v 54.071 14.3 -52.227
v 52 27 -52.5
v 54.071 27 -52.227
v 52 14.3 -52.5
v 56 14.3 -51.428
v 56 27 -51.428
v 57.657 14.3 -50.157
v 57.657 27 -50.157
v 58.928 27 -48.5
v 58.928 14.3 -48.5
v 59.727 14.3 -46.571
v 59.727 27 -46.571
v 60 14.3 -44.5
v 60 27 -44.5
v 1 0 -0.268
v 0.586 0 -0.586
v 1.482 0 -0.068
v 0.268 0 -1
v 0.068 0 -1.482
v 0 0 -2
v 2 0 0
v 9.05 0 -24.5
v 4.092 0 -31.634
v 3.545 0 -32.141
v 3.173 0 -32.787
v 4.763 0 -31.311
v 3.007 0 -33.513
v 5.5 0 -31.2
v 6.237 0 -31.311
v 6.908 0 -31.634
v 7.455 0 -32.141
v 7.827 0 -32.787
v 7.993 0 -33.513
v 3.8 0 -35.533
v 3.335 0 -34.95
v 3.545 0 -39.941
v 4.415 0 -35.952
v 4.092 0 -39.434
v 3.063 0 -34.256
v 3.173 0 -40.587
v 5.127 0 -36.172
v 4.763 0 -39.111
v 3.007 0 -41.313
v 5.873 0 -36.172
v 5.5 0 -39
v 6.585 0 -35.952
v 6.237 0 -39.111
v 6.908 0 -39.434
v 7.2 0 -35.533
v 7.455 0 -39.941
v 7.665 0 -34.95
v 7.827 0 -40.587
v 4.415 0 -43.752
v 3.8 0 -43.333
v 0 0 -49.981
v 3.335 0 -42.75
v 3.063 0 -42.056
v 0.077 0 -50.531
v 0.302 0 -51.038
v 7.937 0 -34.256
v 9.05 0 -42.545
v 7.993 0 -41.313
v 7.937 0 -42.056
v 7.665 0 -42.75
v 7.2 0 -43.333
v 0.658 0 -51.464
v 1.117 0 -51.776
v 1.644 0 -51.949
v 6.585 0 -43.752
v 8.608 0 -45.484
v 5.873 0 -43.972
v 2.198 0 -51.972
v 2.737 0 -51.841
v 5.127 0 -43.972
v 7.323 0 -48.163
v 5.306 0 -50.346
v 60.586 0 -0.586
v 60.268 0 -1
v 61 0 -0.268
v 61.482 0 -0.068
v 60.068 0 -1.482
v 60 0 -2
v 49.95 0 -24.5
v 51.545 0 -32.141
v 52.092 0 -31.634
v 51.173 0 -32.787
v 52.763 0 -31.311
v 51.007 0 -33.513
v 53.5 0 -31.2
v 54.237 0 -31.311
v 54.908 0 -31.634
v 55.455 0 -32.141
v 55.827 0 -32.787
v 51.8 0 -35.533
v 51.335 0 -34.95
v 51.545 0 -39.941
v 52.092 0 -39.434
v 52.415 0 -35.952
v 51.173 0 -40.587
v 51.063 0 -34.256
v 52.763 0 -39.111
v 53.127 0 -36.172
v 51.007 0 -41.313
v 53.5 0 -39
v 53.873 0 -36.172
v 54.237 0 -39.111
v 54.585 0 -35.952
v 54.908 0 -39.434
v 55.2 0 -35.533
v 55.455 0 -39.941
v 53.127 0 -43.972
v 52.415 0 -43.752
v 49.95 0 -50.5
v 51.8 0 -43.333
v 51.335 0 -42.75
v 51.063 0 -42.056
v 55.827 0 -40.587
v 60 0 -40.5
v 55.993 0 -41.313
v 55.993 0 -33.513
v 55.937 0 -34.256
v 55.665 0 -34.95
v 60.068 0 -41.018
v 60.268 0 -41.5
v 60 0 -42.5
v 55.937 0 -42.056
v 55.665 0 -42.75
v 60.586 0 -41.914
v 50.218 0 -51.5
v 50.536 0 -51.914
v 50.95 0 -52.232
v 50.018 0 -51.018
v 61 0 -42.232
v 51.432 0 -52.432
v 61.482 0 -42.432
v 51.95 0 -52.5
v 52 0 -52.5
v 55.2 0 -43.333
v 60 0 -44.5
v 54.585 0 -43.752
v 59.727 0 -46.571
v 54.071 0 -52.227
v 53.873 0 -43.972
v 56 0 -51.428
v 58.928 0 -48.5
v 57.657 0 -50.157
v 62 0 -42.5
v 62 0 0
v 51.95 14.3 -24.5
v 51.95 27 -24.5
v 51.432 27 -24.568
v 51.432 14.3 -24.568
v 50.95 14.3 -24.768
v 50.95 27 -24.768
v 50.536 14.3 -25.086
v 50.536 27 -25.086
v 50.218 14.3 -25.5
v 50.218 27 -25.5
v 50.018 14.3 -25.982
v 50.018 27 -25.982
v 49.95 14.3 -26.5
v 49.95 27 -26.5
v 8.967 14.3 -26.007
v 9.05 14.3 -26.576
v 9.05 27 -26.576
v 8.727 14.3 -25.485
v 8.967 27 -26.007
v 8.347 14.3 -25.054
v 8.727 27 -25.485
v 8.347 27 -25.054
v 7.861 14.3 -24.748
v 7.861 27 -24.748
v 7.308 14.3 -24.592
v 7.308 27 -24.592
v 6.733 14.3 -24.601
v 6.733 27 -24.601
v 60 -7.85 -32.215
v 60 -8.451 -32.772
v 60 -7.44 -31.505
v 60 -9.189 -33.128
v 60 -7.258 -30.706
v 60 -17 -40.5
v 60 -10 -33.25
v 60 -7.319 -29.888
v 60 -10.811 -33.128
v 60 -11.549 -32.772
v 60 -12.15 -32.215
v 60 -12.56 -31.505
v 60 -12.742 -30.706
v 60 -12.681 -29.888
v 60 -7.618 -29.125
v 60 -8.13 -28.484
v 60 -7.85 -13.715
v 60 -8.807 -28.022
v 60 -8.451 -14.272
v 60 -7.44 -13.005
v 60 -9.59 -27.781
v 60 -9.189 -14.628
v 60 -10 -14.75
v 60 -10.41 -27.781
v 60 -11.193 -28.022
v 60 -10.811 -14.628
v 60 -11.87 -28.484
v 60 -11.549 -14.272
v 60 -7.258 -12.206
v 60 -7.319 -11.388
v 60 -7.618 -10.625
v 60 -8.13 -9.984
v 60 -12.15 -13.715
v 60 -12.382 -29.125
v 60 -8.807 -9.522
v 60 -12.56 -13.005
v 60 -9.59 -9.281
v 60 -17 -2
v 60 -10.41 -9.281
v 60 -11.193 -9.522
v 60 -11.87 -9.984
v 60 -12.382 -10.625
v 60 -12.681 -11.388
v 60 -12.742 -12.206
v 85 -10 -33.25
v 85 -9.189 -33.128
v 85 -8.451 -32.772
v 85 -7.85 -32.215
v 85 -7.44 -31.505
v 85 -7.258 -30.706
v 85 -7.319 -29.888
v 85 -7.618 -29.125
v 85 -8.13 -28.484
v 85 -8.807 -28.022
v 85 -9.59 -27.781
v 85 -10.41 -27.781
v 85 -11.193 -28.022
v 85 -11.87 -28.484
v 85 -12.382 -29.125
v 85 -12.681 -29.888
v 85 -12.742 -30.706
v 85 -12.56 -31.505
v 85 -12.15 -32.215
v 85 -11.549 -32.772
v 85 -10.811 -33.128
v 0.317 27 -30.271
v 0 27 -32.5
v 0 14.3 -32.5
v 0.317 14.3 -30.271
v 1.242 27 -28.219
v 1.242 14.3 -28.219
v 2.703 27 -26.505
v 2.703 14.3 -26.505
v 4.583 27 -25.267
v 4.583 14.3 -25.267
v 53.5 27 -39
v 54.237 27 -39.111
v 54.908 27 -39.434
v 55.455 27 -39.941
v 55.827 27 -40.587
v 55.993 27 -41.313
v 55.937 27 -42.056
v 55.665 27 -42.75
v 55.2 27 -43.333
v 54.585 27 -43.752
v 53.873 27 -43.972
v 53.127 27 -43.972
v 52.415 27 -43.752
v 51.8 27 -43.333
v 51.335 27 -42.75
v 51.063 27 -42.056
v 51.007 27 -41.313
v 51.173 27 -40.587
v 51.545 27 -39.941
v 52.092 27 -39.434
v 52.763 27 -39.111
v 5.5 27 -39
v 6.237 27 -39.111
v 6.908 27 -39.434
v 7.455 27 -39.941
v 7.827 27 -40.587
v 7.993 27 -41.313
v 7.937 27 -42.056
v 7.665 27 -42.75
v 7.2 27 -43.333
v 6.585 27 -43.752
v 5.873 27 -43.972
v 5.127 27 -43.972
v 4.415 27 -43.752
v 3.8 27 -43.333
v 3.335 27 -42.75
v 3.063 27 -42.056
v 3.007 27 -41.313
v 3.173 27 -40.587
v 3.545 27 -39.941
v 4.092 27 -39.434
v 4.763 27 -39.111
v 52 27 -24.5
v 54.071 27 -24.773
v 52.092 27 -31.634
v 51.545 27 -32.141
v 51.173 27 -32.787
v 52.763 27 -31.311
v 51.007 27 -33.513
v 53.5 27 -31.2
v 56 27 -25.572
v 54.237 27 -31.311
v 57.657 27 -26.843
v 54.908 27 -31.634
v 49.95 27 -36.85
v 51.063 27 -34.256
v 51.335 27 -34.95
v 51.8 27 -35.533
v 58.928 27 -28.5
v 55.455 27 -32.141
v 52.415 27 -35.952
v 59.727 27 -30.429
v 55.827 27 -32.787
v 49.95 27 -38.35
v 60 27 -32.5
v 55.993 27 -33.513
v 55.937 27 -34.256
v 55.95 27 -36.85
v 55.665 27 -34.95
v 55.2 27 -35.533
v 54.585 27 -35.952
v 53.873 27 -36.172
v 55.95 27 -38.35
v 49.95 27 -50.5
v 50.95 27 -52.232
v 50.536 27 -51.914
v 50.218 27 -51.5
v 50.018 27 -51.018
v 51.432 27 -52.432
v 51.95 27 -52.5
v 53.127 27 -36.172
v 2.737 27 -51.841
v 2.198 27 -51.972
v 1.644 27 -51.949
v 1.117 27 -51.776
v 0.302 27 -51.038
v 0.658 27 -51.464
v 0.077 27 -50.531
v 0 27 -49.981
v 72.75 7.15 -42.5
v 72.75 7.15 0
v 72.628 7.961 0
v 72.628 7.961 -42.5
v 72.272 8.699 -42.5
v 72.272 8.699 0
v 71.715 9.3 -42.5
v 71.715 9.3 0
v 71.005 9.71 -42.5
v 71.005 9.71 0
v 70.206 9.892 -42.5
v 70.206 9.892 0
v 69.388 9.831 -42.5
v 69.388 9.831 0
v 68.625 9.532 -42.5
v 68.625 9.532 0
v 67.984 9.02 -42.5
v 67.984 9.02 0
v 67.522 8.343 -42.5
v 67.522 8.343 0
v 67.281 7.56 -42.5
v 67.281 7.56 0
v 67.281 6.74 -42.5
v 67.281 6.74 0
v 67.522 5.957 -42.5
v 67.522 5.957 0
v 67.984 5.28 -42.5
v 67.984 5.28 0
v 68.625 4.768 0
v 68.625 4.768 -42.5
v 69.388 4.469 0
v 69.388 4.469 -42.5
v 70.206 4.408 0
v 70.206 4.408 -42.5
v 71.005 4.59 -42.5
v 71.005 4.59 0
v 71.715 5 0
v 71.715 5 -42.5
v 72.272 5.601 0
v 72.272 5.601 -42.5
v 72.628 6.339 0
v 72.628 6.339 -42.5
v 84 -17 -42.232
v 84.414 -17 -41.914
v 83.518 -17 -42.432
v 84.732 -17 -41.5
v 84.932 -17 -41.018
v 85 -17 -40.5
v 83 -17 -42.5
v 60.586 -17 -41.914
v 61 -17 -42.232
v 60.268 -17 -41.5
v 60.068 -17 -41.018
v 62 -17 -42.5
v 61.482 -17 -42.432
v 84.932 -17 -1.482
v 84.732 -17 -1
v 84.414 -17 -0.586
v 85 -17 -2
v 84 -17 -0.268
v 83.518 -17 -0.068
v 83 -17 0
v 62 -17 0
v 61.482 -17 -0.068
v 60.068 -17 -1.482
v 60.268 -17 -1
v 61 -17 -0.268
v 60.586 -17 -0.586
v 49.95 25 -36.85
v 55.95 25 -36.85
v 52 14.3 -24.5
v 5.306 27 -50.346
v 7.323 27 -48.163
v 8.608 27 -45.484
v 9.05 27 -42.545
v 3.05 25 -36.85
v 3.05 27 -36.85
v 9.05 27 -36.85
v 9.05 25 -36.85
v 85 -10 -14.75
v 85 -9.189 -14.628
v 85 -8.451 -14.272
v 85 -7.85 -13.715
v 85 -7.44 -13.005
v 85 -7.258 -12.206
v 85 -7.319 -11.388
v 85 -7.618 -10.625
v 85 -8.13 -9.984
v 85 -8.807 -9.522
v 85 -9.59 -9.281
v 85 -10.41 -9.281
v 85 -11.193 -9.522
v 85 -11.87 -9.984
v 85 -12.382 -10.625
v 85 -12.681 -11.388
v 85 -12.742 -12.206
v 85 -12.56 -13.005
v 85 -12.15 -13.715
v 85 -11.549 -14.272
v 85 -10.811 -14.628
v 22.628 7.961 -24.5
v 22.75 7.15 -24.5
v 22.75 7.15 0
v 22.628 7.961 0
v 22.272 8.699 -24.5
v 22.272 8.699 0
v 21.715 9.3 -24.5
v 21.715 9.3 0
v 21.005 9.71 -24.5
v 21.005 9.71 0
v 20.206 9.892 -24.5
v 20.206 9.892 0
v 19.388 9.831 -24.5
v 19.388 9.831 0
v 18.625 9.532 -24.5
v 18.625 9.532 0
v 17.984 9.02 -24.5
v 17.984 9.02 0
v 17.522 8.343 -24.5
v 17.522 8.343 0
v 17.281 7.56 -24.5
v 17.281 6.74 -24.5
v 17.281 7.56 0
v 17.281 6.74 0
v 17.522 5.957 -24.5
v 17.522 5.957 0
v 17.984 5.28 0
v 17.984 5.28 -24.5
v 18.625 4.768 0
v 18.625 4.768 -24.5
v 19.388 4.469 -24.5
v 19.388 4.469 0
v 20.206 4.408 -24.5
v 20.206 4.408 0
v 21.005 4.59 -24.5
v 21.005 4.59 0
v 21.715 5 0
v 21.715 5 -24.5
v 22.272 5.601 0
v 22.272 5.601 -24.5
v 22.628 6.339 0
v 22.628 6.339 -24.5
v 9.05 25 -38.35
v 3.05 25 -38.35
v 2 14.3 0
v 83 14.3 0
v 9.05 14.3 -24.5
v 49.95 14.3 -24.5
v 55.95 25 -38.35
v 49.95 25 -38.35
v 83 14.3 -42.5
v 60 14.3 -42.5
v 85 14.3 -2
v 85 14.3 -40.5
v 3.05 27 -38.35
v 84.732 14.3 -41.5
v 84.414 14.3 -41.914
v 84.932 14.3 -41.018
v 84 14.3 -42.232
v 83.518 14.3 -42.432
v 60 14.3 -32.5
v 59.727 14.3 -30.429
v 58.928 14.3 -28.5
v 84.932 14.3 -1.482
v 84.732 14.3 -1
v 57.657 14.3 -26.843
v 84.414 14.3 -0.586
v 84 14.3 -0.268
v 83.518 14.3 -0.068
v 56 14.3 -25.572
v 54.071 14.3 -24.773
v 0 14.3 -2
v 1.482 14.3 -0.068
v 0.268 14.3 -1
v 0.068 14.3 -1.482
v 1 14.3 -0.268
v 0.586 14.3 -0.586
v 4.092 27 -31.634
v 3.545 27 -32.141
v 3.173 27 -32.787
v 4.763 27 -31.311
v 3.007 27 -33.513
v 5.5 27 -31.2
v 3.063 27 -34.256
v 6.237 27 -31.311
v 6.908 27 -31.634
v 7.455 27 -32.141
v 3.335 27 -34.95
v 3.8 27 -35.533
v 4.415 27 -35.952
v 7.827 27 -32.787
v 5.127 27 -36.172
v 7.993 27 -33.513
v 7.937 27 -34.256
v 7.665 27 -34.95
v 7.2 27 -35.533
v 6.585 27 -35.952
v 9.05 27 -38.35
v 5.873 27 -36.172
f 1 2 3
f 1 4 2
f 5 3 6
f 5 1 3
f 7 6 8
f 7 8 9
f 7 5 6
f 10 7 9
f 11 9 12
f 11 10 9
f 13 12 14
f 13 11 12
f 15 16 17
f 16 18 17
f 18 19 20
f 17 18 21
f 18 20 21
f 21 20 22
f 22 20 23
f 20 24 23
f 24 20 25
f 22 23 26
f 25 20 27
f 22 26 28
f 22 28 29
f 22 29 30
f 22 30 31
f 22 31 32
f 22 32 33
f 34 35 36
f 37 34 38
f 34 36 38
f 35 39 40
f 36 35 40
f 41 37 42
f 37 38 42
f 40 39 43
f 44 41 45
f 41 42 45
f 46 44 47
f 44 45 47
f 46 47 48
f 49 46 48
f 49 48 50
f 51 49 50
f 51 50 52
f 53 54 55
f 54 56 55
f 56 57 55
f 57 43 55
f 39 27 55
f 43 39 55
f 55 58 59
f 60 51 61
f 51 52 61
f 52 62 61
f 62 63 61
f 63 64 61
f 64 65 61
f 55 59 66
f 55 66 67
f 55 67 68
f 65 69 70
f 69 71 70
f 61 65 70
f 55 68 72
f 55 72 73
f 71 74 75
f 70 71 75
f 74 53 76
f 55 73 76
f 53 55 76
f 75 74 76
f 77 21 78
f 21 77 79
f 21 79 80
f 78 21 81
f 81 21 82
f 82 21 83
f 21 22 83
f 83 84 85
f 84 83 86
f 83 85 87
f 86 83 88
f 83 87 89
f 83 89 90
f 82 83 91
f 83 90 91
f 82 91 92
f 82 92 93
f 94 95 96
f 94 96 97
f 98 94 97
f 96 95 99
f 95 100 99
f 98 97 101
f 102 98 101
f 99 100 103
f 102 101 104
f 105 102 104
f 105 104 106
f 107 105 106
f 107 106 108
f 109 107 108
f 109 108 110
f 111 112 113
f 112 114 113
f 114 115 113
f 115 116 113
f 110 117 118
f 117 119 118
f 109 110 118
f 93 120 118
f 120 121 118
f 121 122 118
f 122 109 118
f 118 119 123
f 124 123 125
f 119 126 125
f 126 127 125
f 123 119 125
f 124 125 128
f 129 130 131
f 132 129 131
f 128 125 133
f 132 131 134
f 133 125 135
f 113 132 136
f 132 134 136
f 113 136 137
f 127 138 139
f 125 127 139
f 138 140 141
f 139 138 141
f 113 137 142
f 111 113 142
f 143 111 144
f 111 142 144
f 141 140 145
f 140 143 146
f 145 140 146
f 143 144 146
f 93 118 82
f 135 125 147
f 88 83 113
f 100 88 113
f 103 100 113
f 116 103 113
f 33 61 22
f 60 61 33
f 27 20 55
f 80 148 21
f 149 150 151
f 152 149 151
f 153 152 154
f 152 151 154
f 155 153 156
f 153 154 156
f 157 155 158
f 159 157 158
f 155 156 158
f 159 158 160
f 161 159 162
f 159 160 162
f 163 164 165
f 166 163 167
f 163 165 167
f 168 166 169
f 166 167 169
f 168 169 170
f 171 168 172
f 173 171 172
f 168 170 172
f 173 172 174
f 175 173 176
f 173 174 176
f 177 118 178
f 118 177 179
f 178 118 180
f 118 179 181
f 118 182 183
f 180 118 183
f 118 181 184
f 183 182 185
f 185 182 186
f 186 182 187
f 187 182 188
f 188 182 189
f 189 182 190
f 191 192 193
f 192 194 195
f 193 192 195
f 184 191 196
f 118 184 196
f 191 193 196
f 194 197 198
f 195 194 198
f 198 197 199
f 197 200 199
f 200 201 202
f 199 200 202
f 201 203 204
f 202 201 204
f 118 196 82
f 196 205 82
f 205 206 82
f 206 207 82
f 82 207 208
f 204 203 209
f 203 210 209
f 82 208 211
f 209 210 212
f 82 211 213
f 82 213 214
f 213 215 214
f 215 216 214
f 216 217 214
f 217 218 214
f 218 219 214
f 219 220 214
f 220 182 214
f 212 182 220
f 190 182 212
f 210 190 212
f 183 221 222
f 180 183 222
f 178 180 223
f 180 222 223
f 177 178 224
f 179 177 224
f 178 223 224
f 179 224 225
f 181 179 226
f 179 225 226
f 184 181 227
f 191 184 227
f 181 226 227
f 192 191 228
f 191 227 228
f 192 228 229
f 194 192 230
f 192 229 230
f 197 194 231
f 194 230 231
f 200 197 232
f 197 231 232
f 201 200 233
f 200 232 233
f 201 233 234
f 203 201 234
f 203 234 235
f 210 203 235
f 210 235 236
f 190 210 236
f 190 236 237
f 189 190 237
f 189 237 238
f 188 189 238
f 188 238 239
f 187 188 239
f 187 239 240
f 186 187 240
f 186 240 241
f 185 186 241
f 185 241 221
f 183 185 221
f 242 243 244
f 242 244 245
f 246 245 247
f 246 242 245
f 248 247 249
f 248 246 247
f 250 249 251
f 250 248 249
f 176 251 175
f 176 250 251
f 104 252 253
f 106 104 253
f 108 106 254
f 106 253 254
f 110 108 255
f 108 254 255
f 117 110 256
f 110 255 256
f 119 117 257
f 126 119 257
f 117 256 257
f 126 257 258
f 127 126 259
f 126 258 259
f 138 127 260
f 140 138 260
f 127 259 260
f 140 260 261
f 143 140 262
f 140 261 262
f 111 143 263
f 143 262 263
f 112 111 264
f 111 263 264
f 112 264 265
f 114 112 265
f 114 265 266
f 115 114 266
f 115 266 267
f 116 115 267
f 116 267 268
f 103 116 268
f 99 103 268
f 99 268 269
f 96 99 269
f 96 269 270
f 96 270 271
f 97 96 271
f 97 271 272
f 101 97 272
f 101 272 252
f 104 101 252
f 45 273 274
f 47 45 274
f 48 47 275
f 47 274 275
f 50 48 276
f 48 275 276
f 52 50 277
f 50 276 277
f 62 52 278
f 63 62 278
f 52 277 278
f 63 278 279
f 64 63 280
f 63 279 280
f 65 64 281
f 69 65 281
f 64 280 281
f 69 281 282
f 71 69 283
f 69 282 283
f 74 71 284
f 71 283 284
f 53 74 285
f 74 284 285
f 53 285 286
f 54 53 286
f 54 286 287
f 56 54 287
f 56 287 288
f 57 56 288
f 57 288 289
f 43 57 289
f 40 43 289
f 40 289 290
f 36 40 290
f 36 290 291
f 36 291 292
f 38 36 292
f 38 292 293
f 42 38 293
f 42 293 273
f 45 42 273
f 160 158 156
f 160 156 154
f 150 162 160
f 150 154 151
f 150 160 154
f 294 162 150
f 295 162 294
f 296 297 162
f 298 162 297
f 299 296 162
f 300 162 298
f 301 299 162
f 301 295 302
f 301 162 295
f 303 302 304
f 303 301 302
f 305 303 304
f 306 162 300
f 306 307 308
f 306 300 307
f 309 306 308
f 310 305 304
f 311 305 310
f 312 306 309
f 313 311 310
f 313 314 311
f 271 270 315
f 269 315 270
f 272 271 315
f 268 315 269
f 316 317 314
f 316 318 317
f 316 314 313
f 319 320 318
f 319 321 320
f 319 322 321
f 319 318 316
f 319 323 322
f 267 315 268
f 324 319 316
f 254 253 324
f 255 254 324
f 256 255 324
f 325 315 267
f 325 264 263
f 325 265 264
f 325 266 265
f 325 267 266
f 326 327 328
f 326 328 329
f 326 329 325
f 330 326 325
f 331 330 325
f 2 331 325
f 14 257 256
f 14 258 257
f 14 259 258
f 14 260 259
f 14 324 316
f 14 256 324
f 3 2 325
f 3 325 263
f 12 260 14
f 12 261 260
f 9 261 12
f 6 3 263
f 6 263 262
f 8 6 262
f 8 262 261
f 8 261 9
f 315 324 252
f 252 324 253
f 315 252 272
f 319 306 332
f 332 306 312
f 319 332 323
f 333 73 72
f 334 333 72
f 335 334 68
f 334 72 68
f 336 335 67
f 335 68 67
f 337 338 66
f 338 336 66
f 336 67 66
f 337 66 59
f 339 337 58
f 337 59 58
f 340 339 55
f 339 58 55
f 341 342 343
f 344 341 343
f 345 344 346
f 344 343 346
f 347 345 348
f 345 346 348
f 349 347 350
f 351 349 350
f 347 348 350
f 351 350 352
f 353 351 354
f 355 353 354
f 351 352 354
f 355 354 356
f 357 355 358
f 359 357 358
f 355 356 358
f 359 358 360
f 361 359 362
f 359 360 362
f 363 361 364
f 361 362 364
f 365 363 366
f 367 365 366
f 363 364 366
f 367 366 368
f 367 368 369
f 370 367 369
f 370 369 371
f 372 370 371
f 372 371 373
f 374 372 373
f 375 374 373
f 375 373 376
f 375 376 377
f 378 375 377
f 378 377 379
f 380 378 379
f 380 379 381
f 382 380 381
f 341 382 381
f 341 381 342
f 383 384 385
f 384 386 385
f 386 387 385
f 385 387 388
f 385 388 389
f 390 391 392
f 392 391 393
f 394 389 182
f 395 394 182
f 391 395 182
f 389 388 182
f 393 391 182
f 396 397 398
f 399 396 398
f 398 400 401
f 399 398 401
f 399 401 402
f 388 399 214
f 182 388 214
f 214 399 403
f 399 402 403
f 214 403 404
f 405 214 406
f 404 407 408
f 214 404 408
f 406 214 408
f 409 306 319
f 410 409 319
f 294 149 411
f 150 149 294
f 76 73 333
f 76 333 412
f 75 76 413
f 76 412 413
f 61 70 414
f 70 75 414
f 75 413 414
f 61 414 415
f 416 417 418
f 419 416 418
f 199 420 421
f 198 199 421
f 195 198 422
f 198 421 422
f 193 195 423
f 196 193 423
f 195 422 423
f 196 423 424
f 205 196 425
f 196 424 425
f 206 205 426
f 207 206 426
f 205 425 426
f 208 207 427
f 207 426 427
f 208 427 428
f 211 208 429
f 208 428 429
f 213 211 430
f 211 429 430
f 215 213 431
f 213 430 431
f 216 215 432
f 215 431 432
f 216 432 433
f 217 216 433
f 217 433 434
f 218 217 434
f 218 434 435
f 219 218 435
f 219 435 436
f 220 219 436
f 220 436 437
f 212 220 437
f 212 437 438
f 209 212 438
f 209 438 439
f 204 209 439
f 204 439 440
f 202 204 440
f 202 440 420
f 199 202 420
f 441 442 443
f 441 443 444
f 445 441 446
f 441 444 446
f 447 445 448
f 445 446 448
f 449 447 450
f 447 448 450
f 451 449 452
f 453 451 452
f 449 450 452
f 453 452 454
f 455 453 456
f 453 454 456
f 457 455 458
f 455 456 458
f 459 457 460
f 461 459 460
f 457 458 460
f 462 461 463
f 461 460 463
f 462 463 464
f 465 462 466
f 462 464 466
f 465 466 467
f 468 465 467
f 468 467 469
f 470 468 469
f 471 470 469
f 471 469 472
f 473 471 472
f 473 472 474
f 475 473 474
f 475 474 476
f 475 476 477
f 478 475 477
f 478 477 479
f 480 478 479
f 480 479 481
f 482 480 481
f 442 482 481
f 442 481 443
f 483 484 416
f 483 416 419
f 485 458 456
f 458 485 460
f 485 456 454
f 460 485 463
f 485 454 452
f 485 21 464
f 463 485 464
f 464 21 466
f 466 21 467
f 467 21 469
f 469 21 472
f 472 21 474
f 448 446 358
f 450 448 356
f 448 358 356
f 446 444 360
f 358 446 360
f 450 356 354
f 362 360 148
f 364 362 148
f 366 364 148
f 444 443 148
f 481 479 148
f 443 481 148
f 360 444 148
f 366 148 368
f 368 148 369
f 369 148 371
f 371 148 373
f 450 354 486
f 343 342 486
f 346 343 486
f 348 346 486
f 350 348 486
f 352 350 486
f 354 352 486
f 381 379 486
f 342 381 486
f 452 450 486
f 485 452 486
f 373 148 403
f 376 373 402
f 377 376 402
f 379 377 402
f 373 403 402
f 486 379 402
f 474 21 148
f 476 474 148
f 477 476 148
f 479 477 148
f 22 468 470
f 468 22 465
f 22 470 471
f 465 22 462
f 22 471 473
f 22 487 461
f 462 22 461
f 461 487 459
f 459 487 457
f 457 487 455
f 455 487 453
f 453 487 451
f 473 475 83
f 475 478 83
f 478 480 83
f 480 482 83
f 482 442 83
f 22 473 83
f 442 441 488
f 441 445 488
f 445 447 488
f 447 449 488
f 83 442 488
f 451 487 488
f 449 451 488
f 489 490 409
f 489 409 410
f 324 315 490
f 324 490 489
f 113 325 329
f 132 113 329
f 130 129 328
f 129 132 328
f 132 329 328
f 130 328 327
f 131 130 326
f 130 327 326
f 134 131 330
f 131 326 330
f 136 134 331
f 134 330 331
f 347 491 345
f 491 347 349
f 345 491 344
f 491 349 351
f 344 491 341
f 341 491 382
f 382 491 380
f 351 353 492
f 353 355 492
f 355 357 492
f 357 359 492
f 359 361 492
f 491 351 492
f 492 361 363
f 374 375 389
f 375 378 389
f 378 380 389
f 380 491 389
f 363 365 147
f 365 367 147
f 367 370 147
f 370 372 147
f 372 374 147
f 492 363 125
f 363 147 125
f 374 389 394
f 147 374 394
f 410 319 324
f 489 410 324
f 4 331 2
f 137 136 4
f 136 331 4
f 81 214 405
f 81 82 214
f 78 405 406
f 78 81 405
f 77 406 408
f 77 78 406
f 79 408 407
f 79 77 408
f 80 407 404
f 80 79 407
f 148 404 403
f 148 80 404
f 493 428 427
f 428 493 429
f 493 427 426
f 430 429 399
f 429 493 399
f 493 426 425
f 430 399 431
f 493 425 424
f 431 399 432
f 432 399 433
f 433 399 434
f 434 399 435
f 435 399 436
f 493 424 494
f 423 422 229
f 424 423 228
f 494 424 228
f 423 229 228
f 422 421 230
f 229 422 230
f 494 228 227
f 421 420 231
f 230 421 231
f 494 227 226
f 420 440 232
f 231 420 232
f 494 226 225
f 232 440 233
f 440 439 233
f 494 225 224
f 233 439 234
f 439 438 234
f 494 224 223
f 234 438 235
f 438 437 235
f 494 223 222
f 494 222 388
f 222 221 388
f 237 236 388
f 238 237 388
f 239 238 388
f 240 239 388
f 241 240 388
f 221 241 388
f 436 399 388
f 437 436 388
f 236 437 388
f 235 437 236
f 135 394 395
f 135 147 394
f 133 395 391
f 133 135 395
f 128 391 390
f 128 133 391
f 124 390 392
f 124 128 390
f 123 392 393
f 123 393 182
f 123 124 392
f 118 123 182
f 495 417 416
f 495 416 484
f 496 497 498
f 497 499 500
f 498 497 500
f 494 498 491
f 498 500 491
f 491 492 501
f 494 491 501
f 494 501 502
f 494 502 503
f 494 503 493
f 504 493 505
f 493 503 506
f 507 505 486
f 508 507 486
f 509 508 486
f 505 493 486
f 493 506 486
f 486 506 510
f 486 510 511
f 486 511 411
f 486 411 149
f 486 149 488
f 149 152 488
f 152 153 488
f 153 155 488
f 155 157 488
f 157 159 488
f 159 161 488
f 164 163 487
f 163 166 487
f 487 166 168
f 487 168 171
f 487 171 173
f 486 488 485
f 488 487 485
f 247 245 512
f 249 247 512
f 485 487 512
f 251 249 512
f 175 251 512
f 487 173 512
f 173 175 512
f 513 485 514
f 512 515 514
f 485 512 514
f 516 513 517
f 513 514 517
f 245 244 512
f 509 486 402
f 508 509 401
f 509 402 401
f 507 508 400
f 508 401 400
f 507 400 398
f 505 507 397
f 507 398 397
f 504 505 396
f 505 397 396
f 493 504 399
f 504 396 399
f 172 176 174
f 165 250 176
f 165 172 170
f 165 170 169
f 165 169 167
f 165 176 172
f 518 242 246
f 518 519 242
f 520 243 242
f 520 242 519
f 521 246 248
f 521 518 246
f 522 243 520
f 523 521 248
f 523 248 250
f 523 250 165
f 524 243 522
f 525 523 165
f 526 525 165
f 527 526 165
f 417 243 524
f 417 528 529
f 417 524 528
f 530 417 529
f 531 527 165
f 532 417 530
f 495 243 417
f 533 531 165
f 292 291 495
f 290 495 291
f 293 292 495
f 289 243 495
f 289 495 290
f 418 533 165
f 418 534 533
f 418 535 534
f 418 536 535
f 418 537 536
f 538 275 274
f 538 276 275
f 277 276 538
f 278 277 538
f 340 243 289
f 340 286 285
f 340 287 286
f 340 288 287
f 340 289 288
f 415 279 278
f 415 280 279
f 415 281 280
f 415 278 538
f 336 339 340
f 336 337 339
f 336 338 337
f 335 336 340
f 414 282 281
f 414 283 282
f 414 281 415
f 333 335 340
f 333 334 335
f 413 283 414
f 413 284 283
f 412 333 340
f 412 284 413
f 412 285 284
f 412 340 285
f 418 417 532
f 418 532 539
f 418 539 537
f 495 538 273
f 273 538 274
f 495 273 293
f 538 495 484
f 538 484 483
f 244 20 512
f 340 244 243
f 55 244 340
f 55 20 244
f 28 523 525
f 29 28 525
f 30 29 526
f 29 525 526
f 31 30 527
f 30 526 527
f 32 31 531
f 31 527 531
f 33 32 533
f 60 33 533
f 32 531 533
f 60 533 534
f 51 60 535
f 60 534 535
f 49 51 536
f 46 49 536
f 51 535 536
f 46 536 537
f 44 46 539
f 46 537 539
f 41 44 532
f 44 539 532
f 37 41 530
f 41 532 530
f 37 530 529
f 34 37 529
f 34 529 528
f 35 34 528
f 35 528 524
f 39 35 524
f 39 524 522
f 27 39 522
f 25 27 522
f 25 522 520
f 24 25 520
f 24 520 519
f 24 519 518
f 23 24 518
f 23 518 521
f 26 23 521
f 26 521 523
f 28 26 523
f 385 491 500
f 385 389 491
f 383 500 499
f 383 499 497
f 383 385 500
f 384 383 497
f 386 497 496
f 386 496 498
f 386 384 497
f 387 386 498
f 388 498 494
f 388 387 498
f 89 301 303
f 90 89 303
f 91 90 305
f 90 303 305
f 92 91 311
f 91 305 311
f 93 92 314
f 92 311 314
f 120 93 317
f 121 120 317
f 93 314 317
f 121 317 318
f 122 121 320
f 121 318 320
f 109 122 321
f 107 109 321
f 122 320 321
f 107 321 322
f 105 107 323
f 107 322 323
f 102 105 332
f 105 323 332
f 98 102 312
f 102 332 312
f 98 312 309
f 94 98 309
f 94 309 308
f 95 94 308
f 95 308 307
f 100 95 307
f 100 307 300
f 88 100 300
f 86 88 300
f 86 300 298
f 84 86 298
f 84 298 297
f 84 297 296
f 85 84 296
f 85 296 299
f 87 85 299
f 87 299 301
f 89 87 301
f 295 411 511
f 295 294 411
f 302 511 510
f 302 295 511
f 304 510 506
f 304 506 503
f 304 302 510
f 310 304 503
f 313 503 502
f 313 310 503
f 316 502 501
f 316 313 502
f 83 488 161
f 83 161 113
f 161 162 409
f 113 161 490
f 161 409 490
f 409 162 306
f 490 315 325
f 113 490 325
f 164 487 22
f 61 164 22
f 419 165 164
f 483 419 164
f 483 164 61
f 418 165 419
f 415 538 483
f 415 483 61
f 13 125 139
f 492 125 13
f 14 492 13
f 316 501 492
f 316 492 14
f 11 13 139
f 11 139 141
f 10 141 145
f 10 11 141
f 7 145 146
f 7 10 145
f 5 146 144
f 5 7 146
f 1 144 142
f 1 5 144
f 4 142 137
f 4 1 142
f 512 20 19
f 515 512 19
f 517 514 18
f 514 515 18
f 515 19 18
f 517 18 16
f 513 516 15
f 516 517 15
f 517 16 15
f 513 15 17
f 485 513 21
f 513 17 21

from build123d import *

# Parameters (mm, degrees)
SKETCH1_W           = 85
SKETCH1_H           = 52.5
BOSS_EXTRUDE1_DEPTH = 27
SKETCH2_R           = 2.5
CUT_EXTRUDE1_DEPTH  = 104.490337713
SKETCH4_W           = 24.5
SKETCH4_H           = 12.7
CUT_EXTRUDE2_DEPTH  = 104.490337713
SKETCH5_W           = 25
SKETCH5_H           = 12.7
CUT_EXTRUDE3_DEPTH  = 94.477269964
SKETCH6_W           = 40.9
SKETCH6_H           = 28
CUT_EXTRUDE4_DEPTH  = 104.490337713
FILLET1_R           = 10
FILLET2_R           = 8
FILLET4_R           = 2
SKETCH7_R           = 2.75
CUT_EXTRUDE5_DEPTH  = 104.490337713
SKETCH8_W           = 6
SKETCH8_H           = 1.5
CUT_EXTRUDE6_DEPTH  = 2
CUT_EXTRUDE7_DEPTH  = 101.924427172
BOSS_EXTRUDE2_START = 17
BOSS_EXTRUDE2_DEPTH = 17
SKETCH11_R          = 2.75
CUT_EXTRUDE8_DEPTH  = 104.490337713
FILLET5_R           = 2


with BuildPart() as part:
    # Sketch1 → Boss-Extrude1 (new body)
    with BuildSketch(Plane(origin=(0, 0, 0), x_dir=(1, 0, 0), z_dir=(0, 1, 0))):
        with Locations((42.5, 26.25)):
            Rectangle(SKETCH1_W, SKETCH1_H)
    extrude(amount=BOSS_EXTRUDE1_DEPTH)

    # Sketch2 → Cut-Extrude1 (cut, through all)
    with BuildSketch(Plane(origin=(0, 27, 0), x_dir=(1, 0, 0), z_dir=(0, 1, 0))):
        with Locations(Location((5.5, 41.5, 0), (0, 0, 270))):
            Circle(SKETCH2_R)
        with Locations(Location((53.5, 41.5, 0), (0, 0, 270))):
            Circle(SKETCH2_R)
        with Locations(Location((53.5, 33.7, 0), (0, 0, 270))):
            Circle(SKETCH2_R)
        with Locations(Location((5.5, 33.7, 0), (0, 0, 270))):
            Circle(SKETCH2_R)
    extrude(amount=-CUT_EXTRUDE1_DEPTH, mode=Mode.SUBTRACT)

    # Sketch4 → Cut-Extrude2 (cut, through all)
    with BuildSketch(Plane.ZY):
        with Locations((-12.25, 20.65)):
            Rectangle(SKETCH4_W, SKETCH4_H)
    extrude(amount=-CUT_EXTRUDE2_DEPTH, mode=Mode.SUBTRACT)

    # Sketch5 → Cut-Extrude3 (cut, through all)
    with BuildSketch(Plane.XY.offset(-24.5)):
        with Locations((72.5, 20.65)):
            Rectangle(SKETCH5_W, SKETCH5_H)
    extrude(amount=-CUT_EXTRUDE3_DEPTH, mode=Mode.SUBTRACT)

    # Sketch6 → Cut-Extrude4 (cut, through all)
    with BuildSketch(Plane(origin=(0, 27, 0), x_dir=(1, 0, 0), z_dir=(0, 1, 0))):
        with Locations((29.5, 38.5)):
            Rectangle(SKETCH6_W, SKETCH6_H)
    extrude(amount=-CUT_EXTRUDE4_DEPTH, mode=Mode.SUBTRACT)

    # Fillet1
    # the kernel refuses this fillet: 10 mm, written as the material it takes off along each edge
    with BuildSketch(Plane(origin=(9.05, 51.886931812, -52.5), x_dir=(-1, 0, 0), z_dir=(0, -1, 0))) as fillet1_piece_1:
        with BuildLine():
            CenterArc((10, -9.954772725), FILLET1_R, 95.451319812, 84.548680188)
            Line((0, -9.954772725), (-0.2, -9.954772725))
            Line((-0.2, -9.954772725), (-0.2, 0))
            Line((-0.2, 0), (0, 0.2))
            ThreePointArc((0, 0.2), (4.525, 0.2), (9.031, 0.199095454))
            Line((9.031, 0.199095454), (9.05, 0))
        make_face()
    extrude(amount=76.773863623, mode=Mode.SUBTRACT)

    # Fillet2
    fillet2_edges = [part.edges().sort_by_distance(p)[0] for p in [
        (0, 20.65, -24.5),
        (60, 20.65, -52.5),
        (60, 20.65, -24.5),
    ]]
    fillet(fillet2_edges, radius=FILLET2_R)

    # Fillet4
    # the kernel refuses this fillet: 2 mm, written as the material it takes off along each edge
    with BuildSketch(Plane(origin=(9.05, 32.797158858, -24.5), x_dir=(0, 0, -1), z_dir=(0, -1, 0))) as fillet4_piece_1:
        with BuildLine():
            CenterArc((2.075685694, -2), FILLET4_R, 90, 99.110170153)
            Line((0.100914258, -2.316666667), (-0.096562885, -2.348333333))
            ThreePointArc((-0.096562885, -2.348333333), (-0.2, -1.05), (-0.2, 0))
            Line((-0.2, 0), (0, 0.2))
            Line((0, 0.2), (2.075685694, 0.2))
            Line((2.075685694, 0.2), (2.075685694, 0))
        make_face()
    extrude(amount=18.497158858, mode=Mode.SUBTRACT)
    with BuildSketch(Plane(origin=(49.95, 32, -24.5), x_dir=(0, 0, -1), z_dir=(0, -1, 0))) as fillet4_piece_2:
        with BuildLine():
            CenterArc((FILLET4_R, FILLET4_R), FILLET4_R, 180, 90)
            Line((0, FILLET4_R), (0, 0))
            Line((0, 0), (FILLET4_R, 0))
        make_face()
    extrude(amount=17.7, mode=Mode.SUBTRACT)
    with BuildSketch(Plane(origin=(49.95, 32, -52.5), x_dir=(0, 0, 1), z_dir=(0, -1, 0))) as fillet4_piece_3:
        with BuildLine():
            CenterArc((FILLET4_R, -FILLET4_R), FILLET4_R, 90, 90)
            Line((0, -FILLET4_R), (0, 0))
            Line((0, 0), (FILLET4_R, 0))
        make_face()
    extrude(amount=37, mode=Mode.SUBTRACT)
    with BuildSketch(Plane(origin=(85, -5, -52.5), x_dir=(0, 0, 1), z_dir=(0, 1, 0)), Plane(origin=(85, -5, 0), x_dir=(-1, 0, 0), z_dir=(0, 1, 0)), Plane(origin=(0, -5, 0), x_dir=(0, 0, -1), z_dir=(0, 1, 0))) as fillet4_piece_4:
        with BuildLine():
            CenterArc((FILLET4_R, -FILLET4_R), FILLET4_R, 90, 90)
            Line((0, -FILLET4_R), (0, 0))
            Line((0, 0), (FILLET4_R, 0))
        make_face()
    extrude(amount=24.3, mode=Mode.SUBTRACT)
    with BuildSketch(Plane(origin=(0, -7.039544043, -52.5), x_dir=(0.972186544788057, 0, 0.23420786095487744), z_dir=(0, 1, 0))) as fillet4_piece_5:
        with BuildLine():
            CenterArc((2.534235855, -1.980078713), FILLET4_R, 81.906386313, 111.638547186)
            Line((0.589862766, -2.448494435), (0, 0))
            ThreePointArc((0, 0), (1.407908809, 0.099606433), (2.815817617, 0))
        make_face()
    extrude(amount=41.079088086, mode=Mode.SUBTRACT)

    # Sketch7 → Cut-Extrude5 (cut, through all)
    with BuildSketch(Plane.XY):
        with Locations((70, 7.15)):
            Circle(SKETCH7_R)
        with Locations((20, 7.15)):
            Circle(SKETCH7_R)
    extrude(amount=-CUT_EXTRUDE5_DEPTH, mode=Mode.SUBTRACT)

    # Sketch8 → Cut-Extrude6 (cut)
    with BuildSketch(Plane(origin=(0, 27, 0), x_dir=(1, 0, 0), z_dir=(0, 1, 0))):
        with Locations((6.05, 37.6)):
            Rectangle(SKETCH8_W, SKETCH8_H)
        with Locations((52.95, 37.6)):
            Rectangle(SKETCH8_W, SKETCH8_H)
    extrude(amount=-CUT_EXTRUDE6_DEPTH, mode=Mode.SUBTRACT)

    # Sketch9 → Cut-Extrude7 (cut, through all)
    with BuildSketch(Plane(origin=(0, 14.3, 0), x_dir=(1, 0, 0), z_dir=(0, 1, 0))):
        with BuildLine():
            Line((85, 42.5), (60, 42.5))
            Line((60, 42.5), (60, 44.5))
            ThreePointArc((60, 44.5), (57.656854249, 50.156854249), (52, 52.5))
            Line((52, 52.5), (83, 52.5))
            Line((83, 52.5), (85, 52.5))
            Line((85, 52.5), (85, 42.5))
        make_face()
    extrude(amount=-CUT_EXTRUDE7_DEPTH, mode=Mode.SUBTRACT)

    # Sketch10 → Boss-Extrude2 (add)
    with BuildSketch(Plane.XZ.offset(BOSS_EXTRUDE2_START)):
        with BuildLine():
            Line((85, -42.5), (60, -42.5))
            Line((60, -42.5), (60, 0))
            Line((60, 0), (83, 0))
            ThreePointArc((83, 0), (84.414213562, -0.585786438), (85, -2))
            Line((85, -2), (85, -42.5))
        make_face()
    extrude(amount=-BOSS_EXTRUDE2_DEPTH)

    # Sketch11 → Cut-Extrude8 (cut, through all)
    with BuildSketch(Plane(origin=(85, 0, 0), x_dir=(0, 0, -1), z_dir=(1, 0, 0))):
        with Locations((30.5, -10)):
            Circle(SKETCH11_R)
        with Locations((12, -10)):
            Circle(SKETCH11_R)
    extrude(amount=-CUT_EXTRUDE8_DEPTH, mode=Mode.SUBTRACT)

    # Fillet5
    fillet5_edges = [part.edges().sort_by_distance(p)[0] for p in [
        (85, -1.35, -42.5),
        (60, -8.5, 0),
        (60, -8.5, -42.5),
    ]]
    fillet(fillet5_edges, radius=FILLET5_R)


solid = part.part
